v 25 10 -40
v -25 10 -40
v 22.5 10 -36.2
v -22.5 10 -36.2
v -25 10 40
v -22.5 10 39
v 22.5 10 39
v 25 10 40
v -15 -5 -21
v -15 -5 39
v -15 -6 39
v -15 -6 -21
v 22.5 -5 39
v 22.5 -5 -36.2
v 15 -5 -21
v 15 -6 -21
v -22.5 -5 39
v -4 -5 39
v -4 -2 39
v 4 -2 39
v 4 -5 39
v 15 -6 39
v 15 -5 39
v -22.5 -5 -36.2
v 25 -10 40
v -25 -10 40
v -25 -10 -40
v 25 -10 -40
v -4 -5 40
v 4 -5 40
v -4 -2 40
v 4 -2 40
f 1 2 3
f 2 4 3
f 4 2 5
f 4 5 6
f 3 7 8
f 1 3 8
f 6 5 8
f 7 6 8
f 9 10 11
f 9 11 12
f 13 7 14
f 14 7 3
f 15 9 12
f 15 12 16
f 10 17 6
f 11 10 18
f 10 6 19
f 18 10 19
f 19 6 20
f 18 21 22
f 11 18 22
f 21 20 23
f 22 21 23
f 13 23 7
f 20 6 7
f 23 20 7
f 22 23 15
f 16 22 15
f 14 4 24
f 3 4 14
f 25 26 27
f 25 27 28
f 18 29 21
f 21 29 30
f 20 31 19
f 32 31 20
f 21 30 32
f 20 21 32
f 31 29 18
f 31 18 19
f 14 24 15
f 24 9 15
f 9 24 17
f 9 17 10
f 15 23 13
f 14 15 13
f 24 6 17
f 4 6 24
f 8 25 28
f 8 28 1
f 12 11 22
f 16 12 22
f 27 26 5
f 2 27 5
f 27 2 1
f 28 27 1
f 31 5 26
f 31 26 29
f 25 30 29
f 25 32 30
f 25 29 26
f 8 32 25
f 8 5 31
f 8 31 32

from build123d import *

# Parameters (mm, degrees)
SKETCH1_W           = 50
SKETCH1_H           = 20
BOSS_EXTRUDE1_DEPTH = 40
SKETCH2_W           = 45
SKETCH2_H           = 75.2
CUT_EXTRUDE1_DEPTH  = 15
CUT_EXTRUDE2_REACH  = 86.41
SKETCH3_W           = 8
SKETCH3_H           = 3
SKETCH4_W           = 30
SKETCH4_H           = 60
CUT_EXTRUDE3_DEPTH  = 1


with BuildPart() as part:
    # Sketch1 → Boss-Extrude1 (new, symmetric)
    with BuildSketch(Plane.XY):
        Rectangle(SKETCH1_W, SKETCH1_H)
    extrude(amount=BOSS_EXTRUDE1_DEPTH, both=True)

    # Sketch2 → Cut-Extrude1 (cut)
    with BuildSketch(Plane(origin=(0, 10, 0), x_dir=(1, 0, 0), z_dir=(0, 1, 0))):
        with Locations((0, -1.4)):
            Rectangle(SKETCH2_W, SKETCH2_H)
    extrude(amount=-CUT_EXTRUDE1_DEPTH, mode=Mode.SUBTRACT)

    # Sketch3 → Cut-Extrude2 (cut, up to next)
    with BuildSketch(Plane.XY.offset(40), mode=Mode.PRIVATE) as cut_extrude2_sk1:
        with Locations((0, -3.5)):
            Rectangle(SKETCH3_W, SKETCH3_H)
    cut_extrude2_tool1 = extrude(cut_extrude2_sk1.sketch, amount=-CUT_EXTRUDE2_REACH, mode=Mode.PRIVATE) & part.part
    add(cut_extrude2_tool1.solids().sort_by_distance((0, -3.5, 40))[0], mode=Mode.SUBTRACT)

    # Sketch4 → Cut-Extrude3 (cut)
    with BuildSketch(Plane(origin=(0, -5, 0), x_dir=(1, 0, 0), z_dir=(0, 1, 0))):
        with Locations((0, -9)):
            Rectangle(SKETCH4_W, SKETCH4_H)
    extrude(amount=-CUT_EXTRUDE3_DEPTH, mode=Mode.SUBTRACT)


solid = part.part
